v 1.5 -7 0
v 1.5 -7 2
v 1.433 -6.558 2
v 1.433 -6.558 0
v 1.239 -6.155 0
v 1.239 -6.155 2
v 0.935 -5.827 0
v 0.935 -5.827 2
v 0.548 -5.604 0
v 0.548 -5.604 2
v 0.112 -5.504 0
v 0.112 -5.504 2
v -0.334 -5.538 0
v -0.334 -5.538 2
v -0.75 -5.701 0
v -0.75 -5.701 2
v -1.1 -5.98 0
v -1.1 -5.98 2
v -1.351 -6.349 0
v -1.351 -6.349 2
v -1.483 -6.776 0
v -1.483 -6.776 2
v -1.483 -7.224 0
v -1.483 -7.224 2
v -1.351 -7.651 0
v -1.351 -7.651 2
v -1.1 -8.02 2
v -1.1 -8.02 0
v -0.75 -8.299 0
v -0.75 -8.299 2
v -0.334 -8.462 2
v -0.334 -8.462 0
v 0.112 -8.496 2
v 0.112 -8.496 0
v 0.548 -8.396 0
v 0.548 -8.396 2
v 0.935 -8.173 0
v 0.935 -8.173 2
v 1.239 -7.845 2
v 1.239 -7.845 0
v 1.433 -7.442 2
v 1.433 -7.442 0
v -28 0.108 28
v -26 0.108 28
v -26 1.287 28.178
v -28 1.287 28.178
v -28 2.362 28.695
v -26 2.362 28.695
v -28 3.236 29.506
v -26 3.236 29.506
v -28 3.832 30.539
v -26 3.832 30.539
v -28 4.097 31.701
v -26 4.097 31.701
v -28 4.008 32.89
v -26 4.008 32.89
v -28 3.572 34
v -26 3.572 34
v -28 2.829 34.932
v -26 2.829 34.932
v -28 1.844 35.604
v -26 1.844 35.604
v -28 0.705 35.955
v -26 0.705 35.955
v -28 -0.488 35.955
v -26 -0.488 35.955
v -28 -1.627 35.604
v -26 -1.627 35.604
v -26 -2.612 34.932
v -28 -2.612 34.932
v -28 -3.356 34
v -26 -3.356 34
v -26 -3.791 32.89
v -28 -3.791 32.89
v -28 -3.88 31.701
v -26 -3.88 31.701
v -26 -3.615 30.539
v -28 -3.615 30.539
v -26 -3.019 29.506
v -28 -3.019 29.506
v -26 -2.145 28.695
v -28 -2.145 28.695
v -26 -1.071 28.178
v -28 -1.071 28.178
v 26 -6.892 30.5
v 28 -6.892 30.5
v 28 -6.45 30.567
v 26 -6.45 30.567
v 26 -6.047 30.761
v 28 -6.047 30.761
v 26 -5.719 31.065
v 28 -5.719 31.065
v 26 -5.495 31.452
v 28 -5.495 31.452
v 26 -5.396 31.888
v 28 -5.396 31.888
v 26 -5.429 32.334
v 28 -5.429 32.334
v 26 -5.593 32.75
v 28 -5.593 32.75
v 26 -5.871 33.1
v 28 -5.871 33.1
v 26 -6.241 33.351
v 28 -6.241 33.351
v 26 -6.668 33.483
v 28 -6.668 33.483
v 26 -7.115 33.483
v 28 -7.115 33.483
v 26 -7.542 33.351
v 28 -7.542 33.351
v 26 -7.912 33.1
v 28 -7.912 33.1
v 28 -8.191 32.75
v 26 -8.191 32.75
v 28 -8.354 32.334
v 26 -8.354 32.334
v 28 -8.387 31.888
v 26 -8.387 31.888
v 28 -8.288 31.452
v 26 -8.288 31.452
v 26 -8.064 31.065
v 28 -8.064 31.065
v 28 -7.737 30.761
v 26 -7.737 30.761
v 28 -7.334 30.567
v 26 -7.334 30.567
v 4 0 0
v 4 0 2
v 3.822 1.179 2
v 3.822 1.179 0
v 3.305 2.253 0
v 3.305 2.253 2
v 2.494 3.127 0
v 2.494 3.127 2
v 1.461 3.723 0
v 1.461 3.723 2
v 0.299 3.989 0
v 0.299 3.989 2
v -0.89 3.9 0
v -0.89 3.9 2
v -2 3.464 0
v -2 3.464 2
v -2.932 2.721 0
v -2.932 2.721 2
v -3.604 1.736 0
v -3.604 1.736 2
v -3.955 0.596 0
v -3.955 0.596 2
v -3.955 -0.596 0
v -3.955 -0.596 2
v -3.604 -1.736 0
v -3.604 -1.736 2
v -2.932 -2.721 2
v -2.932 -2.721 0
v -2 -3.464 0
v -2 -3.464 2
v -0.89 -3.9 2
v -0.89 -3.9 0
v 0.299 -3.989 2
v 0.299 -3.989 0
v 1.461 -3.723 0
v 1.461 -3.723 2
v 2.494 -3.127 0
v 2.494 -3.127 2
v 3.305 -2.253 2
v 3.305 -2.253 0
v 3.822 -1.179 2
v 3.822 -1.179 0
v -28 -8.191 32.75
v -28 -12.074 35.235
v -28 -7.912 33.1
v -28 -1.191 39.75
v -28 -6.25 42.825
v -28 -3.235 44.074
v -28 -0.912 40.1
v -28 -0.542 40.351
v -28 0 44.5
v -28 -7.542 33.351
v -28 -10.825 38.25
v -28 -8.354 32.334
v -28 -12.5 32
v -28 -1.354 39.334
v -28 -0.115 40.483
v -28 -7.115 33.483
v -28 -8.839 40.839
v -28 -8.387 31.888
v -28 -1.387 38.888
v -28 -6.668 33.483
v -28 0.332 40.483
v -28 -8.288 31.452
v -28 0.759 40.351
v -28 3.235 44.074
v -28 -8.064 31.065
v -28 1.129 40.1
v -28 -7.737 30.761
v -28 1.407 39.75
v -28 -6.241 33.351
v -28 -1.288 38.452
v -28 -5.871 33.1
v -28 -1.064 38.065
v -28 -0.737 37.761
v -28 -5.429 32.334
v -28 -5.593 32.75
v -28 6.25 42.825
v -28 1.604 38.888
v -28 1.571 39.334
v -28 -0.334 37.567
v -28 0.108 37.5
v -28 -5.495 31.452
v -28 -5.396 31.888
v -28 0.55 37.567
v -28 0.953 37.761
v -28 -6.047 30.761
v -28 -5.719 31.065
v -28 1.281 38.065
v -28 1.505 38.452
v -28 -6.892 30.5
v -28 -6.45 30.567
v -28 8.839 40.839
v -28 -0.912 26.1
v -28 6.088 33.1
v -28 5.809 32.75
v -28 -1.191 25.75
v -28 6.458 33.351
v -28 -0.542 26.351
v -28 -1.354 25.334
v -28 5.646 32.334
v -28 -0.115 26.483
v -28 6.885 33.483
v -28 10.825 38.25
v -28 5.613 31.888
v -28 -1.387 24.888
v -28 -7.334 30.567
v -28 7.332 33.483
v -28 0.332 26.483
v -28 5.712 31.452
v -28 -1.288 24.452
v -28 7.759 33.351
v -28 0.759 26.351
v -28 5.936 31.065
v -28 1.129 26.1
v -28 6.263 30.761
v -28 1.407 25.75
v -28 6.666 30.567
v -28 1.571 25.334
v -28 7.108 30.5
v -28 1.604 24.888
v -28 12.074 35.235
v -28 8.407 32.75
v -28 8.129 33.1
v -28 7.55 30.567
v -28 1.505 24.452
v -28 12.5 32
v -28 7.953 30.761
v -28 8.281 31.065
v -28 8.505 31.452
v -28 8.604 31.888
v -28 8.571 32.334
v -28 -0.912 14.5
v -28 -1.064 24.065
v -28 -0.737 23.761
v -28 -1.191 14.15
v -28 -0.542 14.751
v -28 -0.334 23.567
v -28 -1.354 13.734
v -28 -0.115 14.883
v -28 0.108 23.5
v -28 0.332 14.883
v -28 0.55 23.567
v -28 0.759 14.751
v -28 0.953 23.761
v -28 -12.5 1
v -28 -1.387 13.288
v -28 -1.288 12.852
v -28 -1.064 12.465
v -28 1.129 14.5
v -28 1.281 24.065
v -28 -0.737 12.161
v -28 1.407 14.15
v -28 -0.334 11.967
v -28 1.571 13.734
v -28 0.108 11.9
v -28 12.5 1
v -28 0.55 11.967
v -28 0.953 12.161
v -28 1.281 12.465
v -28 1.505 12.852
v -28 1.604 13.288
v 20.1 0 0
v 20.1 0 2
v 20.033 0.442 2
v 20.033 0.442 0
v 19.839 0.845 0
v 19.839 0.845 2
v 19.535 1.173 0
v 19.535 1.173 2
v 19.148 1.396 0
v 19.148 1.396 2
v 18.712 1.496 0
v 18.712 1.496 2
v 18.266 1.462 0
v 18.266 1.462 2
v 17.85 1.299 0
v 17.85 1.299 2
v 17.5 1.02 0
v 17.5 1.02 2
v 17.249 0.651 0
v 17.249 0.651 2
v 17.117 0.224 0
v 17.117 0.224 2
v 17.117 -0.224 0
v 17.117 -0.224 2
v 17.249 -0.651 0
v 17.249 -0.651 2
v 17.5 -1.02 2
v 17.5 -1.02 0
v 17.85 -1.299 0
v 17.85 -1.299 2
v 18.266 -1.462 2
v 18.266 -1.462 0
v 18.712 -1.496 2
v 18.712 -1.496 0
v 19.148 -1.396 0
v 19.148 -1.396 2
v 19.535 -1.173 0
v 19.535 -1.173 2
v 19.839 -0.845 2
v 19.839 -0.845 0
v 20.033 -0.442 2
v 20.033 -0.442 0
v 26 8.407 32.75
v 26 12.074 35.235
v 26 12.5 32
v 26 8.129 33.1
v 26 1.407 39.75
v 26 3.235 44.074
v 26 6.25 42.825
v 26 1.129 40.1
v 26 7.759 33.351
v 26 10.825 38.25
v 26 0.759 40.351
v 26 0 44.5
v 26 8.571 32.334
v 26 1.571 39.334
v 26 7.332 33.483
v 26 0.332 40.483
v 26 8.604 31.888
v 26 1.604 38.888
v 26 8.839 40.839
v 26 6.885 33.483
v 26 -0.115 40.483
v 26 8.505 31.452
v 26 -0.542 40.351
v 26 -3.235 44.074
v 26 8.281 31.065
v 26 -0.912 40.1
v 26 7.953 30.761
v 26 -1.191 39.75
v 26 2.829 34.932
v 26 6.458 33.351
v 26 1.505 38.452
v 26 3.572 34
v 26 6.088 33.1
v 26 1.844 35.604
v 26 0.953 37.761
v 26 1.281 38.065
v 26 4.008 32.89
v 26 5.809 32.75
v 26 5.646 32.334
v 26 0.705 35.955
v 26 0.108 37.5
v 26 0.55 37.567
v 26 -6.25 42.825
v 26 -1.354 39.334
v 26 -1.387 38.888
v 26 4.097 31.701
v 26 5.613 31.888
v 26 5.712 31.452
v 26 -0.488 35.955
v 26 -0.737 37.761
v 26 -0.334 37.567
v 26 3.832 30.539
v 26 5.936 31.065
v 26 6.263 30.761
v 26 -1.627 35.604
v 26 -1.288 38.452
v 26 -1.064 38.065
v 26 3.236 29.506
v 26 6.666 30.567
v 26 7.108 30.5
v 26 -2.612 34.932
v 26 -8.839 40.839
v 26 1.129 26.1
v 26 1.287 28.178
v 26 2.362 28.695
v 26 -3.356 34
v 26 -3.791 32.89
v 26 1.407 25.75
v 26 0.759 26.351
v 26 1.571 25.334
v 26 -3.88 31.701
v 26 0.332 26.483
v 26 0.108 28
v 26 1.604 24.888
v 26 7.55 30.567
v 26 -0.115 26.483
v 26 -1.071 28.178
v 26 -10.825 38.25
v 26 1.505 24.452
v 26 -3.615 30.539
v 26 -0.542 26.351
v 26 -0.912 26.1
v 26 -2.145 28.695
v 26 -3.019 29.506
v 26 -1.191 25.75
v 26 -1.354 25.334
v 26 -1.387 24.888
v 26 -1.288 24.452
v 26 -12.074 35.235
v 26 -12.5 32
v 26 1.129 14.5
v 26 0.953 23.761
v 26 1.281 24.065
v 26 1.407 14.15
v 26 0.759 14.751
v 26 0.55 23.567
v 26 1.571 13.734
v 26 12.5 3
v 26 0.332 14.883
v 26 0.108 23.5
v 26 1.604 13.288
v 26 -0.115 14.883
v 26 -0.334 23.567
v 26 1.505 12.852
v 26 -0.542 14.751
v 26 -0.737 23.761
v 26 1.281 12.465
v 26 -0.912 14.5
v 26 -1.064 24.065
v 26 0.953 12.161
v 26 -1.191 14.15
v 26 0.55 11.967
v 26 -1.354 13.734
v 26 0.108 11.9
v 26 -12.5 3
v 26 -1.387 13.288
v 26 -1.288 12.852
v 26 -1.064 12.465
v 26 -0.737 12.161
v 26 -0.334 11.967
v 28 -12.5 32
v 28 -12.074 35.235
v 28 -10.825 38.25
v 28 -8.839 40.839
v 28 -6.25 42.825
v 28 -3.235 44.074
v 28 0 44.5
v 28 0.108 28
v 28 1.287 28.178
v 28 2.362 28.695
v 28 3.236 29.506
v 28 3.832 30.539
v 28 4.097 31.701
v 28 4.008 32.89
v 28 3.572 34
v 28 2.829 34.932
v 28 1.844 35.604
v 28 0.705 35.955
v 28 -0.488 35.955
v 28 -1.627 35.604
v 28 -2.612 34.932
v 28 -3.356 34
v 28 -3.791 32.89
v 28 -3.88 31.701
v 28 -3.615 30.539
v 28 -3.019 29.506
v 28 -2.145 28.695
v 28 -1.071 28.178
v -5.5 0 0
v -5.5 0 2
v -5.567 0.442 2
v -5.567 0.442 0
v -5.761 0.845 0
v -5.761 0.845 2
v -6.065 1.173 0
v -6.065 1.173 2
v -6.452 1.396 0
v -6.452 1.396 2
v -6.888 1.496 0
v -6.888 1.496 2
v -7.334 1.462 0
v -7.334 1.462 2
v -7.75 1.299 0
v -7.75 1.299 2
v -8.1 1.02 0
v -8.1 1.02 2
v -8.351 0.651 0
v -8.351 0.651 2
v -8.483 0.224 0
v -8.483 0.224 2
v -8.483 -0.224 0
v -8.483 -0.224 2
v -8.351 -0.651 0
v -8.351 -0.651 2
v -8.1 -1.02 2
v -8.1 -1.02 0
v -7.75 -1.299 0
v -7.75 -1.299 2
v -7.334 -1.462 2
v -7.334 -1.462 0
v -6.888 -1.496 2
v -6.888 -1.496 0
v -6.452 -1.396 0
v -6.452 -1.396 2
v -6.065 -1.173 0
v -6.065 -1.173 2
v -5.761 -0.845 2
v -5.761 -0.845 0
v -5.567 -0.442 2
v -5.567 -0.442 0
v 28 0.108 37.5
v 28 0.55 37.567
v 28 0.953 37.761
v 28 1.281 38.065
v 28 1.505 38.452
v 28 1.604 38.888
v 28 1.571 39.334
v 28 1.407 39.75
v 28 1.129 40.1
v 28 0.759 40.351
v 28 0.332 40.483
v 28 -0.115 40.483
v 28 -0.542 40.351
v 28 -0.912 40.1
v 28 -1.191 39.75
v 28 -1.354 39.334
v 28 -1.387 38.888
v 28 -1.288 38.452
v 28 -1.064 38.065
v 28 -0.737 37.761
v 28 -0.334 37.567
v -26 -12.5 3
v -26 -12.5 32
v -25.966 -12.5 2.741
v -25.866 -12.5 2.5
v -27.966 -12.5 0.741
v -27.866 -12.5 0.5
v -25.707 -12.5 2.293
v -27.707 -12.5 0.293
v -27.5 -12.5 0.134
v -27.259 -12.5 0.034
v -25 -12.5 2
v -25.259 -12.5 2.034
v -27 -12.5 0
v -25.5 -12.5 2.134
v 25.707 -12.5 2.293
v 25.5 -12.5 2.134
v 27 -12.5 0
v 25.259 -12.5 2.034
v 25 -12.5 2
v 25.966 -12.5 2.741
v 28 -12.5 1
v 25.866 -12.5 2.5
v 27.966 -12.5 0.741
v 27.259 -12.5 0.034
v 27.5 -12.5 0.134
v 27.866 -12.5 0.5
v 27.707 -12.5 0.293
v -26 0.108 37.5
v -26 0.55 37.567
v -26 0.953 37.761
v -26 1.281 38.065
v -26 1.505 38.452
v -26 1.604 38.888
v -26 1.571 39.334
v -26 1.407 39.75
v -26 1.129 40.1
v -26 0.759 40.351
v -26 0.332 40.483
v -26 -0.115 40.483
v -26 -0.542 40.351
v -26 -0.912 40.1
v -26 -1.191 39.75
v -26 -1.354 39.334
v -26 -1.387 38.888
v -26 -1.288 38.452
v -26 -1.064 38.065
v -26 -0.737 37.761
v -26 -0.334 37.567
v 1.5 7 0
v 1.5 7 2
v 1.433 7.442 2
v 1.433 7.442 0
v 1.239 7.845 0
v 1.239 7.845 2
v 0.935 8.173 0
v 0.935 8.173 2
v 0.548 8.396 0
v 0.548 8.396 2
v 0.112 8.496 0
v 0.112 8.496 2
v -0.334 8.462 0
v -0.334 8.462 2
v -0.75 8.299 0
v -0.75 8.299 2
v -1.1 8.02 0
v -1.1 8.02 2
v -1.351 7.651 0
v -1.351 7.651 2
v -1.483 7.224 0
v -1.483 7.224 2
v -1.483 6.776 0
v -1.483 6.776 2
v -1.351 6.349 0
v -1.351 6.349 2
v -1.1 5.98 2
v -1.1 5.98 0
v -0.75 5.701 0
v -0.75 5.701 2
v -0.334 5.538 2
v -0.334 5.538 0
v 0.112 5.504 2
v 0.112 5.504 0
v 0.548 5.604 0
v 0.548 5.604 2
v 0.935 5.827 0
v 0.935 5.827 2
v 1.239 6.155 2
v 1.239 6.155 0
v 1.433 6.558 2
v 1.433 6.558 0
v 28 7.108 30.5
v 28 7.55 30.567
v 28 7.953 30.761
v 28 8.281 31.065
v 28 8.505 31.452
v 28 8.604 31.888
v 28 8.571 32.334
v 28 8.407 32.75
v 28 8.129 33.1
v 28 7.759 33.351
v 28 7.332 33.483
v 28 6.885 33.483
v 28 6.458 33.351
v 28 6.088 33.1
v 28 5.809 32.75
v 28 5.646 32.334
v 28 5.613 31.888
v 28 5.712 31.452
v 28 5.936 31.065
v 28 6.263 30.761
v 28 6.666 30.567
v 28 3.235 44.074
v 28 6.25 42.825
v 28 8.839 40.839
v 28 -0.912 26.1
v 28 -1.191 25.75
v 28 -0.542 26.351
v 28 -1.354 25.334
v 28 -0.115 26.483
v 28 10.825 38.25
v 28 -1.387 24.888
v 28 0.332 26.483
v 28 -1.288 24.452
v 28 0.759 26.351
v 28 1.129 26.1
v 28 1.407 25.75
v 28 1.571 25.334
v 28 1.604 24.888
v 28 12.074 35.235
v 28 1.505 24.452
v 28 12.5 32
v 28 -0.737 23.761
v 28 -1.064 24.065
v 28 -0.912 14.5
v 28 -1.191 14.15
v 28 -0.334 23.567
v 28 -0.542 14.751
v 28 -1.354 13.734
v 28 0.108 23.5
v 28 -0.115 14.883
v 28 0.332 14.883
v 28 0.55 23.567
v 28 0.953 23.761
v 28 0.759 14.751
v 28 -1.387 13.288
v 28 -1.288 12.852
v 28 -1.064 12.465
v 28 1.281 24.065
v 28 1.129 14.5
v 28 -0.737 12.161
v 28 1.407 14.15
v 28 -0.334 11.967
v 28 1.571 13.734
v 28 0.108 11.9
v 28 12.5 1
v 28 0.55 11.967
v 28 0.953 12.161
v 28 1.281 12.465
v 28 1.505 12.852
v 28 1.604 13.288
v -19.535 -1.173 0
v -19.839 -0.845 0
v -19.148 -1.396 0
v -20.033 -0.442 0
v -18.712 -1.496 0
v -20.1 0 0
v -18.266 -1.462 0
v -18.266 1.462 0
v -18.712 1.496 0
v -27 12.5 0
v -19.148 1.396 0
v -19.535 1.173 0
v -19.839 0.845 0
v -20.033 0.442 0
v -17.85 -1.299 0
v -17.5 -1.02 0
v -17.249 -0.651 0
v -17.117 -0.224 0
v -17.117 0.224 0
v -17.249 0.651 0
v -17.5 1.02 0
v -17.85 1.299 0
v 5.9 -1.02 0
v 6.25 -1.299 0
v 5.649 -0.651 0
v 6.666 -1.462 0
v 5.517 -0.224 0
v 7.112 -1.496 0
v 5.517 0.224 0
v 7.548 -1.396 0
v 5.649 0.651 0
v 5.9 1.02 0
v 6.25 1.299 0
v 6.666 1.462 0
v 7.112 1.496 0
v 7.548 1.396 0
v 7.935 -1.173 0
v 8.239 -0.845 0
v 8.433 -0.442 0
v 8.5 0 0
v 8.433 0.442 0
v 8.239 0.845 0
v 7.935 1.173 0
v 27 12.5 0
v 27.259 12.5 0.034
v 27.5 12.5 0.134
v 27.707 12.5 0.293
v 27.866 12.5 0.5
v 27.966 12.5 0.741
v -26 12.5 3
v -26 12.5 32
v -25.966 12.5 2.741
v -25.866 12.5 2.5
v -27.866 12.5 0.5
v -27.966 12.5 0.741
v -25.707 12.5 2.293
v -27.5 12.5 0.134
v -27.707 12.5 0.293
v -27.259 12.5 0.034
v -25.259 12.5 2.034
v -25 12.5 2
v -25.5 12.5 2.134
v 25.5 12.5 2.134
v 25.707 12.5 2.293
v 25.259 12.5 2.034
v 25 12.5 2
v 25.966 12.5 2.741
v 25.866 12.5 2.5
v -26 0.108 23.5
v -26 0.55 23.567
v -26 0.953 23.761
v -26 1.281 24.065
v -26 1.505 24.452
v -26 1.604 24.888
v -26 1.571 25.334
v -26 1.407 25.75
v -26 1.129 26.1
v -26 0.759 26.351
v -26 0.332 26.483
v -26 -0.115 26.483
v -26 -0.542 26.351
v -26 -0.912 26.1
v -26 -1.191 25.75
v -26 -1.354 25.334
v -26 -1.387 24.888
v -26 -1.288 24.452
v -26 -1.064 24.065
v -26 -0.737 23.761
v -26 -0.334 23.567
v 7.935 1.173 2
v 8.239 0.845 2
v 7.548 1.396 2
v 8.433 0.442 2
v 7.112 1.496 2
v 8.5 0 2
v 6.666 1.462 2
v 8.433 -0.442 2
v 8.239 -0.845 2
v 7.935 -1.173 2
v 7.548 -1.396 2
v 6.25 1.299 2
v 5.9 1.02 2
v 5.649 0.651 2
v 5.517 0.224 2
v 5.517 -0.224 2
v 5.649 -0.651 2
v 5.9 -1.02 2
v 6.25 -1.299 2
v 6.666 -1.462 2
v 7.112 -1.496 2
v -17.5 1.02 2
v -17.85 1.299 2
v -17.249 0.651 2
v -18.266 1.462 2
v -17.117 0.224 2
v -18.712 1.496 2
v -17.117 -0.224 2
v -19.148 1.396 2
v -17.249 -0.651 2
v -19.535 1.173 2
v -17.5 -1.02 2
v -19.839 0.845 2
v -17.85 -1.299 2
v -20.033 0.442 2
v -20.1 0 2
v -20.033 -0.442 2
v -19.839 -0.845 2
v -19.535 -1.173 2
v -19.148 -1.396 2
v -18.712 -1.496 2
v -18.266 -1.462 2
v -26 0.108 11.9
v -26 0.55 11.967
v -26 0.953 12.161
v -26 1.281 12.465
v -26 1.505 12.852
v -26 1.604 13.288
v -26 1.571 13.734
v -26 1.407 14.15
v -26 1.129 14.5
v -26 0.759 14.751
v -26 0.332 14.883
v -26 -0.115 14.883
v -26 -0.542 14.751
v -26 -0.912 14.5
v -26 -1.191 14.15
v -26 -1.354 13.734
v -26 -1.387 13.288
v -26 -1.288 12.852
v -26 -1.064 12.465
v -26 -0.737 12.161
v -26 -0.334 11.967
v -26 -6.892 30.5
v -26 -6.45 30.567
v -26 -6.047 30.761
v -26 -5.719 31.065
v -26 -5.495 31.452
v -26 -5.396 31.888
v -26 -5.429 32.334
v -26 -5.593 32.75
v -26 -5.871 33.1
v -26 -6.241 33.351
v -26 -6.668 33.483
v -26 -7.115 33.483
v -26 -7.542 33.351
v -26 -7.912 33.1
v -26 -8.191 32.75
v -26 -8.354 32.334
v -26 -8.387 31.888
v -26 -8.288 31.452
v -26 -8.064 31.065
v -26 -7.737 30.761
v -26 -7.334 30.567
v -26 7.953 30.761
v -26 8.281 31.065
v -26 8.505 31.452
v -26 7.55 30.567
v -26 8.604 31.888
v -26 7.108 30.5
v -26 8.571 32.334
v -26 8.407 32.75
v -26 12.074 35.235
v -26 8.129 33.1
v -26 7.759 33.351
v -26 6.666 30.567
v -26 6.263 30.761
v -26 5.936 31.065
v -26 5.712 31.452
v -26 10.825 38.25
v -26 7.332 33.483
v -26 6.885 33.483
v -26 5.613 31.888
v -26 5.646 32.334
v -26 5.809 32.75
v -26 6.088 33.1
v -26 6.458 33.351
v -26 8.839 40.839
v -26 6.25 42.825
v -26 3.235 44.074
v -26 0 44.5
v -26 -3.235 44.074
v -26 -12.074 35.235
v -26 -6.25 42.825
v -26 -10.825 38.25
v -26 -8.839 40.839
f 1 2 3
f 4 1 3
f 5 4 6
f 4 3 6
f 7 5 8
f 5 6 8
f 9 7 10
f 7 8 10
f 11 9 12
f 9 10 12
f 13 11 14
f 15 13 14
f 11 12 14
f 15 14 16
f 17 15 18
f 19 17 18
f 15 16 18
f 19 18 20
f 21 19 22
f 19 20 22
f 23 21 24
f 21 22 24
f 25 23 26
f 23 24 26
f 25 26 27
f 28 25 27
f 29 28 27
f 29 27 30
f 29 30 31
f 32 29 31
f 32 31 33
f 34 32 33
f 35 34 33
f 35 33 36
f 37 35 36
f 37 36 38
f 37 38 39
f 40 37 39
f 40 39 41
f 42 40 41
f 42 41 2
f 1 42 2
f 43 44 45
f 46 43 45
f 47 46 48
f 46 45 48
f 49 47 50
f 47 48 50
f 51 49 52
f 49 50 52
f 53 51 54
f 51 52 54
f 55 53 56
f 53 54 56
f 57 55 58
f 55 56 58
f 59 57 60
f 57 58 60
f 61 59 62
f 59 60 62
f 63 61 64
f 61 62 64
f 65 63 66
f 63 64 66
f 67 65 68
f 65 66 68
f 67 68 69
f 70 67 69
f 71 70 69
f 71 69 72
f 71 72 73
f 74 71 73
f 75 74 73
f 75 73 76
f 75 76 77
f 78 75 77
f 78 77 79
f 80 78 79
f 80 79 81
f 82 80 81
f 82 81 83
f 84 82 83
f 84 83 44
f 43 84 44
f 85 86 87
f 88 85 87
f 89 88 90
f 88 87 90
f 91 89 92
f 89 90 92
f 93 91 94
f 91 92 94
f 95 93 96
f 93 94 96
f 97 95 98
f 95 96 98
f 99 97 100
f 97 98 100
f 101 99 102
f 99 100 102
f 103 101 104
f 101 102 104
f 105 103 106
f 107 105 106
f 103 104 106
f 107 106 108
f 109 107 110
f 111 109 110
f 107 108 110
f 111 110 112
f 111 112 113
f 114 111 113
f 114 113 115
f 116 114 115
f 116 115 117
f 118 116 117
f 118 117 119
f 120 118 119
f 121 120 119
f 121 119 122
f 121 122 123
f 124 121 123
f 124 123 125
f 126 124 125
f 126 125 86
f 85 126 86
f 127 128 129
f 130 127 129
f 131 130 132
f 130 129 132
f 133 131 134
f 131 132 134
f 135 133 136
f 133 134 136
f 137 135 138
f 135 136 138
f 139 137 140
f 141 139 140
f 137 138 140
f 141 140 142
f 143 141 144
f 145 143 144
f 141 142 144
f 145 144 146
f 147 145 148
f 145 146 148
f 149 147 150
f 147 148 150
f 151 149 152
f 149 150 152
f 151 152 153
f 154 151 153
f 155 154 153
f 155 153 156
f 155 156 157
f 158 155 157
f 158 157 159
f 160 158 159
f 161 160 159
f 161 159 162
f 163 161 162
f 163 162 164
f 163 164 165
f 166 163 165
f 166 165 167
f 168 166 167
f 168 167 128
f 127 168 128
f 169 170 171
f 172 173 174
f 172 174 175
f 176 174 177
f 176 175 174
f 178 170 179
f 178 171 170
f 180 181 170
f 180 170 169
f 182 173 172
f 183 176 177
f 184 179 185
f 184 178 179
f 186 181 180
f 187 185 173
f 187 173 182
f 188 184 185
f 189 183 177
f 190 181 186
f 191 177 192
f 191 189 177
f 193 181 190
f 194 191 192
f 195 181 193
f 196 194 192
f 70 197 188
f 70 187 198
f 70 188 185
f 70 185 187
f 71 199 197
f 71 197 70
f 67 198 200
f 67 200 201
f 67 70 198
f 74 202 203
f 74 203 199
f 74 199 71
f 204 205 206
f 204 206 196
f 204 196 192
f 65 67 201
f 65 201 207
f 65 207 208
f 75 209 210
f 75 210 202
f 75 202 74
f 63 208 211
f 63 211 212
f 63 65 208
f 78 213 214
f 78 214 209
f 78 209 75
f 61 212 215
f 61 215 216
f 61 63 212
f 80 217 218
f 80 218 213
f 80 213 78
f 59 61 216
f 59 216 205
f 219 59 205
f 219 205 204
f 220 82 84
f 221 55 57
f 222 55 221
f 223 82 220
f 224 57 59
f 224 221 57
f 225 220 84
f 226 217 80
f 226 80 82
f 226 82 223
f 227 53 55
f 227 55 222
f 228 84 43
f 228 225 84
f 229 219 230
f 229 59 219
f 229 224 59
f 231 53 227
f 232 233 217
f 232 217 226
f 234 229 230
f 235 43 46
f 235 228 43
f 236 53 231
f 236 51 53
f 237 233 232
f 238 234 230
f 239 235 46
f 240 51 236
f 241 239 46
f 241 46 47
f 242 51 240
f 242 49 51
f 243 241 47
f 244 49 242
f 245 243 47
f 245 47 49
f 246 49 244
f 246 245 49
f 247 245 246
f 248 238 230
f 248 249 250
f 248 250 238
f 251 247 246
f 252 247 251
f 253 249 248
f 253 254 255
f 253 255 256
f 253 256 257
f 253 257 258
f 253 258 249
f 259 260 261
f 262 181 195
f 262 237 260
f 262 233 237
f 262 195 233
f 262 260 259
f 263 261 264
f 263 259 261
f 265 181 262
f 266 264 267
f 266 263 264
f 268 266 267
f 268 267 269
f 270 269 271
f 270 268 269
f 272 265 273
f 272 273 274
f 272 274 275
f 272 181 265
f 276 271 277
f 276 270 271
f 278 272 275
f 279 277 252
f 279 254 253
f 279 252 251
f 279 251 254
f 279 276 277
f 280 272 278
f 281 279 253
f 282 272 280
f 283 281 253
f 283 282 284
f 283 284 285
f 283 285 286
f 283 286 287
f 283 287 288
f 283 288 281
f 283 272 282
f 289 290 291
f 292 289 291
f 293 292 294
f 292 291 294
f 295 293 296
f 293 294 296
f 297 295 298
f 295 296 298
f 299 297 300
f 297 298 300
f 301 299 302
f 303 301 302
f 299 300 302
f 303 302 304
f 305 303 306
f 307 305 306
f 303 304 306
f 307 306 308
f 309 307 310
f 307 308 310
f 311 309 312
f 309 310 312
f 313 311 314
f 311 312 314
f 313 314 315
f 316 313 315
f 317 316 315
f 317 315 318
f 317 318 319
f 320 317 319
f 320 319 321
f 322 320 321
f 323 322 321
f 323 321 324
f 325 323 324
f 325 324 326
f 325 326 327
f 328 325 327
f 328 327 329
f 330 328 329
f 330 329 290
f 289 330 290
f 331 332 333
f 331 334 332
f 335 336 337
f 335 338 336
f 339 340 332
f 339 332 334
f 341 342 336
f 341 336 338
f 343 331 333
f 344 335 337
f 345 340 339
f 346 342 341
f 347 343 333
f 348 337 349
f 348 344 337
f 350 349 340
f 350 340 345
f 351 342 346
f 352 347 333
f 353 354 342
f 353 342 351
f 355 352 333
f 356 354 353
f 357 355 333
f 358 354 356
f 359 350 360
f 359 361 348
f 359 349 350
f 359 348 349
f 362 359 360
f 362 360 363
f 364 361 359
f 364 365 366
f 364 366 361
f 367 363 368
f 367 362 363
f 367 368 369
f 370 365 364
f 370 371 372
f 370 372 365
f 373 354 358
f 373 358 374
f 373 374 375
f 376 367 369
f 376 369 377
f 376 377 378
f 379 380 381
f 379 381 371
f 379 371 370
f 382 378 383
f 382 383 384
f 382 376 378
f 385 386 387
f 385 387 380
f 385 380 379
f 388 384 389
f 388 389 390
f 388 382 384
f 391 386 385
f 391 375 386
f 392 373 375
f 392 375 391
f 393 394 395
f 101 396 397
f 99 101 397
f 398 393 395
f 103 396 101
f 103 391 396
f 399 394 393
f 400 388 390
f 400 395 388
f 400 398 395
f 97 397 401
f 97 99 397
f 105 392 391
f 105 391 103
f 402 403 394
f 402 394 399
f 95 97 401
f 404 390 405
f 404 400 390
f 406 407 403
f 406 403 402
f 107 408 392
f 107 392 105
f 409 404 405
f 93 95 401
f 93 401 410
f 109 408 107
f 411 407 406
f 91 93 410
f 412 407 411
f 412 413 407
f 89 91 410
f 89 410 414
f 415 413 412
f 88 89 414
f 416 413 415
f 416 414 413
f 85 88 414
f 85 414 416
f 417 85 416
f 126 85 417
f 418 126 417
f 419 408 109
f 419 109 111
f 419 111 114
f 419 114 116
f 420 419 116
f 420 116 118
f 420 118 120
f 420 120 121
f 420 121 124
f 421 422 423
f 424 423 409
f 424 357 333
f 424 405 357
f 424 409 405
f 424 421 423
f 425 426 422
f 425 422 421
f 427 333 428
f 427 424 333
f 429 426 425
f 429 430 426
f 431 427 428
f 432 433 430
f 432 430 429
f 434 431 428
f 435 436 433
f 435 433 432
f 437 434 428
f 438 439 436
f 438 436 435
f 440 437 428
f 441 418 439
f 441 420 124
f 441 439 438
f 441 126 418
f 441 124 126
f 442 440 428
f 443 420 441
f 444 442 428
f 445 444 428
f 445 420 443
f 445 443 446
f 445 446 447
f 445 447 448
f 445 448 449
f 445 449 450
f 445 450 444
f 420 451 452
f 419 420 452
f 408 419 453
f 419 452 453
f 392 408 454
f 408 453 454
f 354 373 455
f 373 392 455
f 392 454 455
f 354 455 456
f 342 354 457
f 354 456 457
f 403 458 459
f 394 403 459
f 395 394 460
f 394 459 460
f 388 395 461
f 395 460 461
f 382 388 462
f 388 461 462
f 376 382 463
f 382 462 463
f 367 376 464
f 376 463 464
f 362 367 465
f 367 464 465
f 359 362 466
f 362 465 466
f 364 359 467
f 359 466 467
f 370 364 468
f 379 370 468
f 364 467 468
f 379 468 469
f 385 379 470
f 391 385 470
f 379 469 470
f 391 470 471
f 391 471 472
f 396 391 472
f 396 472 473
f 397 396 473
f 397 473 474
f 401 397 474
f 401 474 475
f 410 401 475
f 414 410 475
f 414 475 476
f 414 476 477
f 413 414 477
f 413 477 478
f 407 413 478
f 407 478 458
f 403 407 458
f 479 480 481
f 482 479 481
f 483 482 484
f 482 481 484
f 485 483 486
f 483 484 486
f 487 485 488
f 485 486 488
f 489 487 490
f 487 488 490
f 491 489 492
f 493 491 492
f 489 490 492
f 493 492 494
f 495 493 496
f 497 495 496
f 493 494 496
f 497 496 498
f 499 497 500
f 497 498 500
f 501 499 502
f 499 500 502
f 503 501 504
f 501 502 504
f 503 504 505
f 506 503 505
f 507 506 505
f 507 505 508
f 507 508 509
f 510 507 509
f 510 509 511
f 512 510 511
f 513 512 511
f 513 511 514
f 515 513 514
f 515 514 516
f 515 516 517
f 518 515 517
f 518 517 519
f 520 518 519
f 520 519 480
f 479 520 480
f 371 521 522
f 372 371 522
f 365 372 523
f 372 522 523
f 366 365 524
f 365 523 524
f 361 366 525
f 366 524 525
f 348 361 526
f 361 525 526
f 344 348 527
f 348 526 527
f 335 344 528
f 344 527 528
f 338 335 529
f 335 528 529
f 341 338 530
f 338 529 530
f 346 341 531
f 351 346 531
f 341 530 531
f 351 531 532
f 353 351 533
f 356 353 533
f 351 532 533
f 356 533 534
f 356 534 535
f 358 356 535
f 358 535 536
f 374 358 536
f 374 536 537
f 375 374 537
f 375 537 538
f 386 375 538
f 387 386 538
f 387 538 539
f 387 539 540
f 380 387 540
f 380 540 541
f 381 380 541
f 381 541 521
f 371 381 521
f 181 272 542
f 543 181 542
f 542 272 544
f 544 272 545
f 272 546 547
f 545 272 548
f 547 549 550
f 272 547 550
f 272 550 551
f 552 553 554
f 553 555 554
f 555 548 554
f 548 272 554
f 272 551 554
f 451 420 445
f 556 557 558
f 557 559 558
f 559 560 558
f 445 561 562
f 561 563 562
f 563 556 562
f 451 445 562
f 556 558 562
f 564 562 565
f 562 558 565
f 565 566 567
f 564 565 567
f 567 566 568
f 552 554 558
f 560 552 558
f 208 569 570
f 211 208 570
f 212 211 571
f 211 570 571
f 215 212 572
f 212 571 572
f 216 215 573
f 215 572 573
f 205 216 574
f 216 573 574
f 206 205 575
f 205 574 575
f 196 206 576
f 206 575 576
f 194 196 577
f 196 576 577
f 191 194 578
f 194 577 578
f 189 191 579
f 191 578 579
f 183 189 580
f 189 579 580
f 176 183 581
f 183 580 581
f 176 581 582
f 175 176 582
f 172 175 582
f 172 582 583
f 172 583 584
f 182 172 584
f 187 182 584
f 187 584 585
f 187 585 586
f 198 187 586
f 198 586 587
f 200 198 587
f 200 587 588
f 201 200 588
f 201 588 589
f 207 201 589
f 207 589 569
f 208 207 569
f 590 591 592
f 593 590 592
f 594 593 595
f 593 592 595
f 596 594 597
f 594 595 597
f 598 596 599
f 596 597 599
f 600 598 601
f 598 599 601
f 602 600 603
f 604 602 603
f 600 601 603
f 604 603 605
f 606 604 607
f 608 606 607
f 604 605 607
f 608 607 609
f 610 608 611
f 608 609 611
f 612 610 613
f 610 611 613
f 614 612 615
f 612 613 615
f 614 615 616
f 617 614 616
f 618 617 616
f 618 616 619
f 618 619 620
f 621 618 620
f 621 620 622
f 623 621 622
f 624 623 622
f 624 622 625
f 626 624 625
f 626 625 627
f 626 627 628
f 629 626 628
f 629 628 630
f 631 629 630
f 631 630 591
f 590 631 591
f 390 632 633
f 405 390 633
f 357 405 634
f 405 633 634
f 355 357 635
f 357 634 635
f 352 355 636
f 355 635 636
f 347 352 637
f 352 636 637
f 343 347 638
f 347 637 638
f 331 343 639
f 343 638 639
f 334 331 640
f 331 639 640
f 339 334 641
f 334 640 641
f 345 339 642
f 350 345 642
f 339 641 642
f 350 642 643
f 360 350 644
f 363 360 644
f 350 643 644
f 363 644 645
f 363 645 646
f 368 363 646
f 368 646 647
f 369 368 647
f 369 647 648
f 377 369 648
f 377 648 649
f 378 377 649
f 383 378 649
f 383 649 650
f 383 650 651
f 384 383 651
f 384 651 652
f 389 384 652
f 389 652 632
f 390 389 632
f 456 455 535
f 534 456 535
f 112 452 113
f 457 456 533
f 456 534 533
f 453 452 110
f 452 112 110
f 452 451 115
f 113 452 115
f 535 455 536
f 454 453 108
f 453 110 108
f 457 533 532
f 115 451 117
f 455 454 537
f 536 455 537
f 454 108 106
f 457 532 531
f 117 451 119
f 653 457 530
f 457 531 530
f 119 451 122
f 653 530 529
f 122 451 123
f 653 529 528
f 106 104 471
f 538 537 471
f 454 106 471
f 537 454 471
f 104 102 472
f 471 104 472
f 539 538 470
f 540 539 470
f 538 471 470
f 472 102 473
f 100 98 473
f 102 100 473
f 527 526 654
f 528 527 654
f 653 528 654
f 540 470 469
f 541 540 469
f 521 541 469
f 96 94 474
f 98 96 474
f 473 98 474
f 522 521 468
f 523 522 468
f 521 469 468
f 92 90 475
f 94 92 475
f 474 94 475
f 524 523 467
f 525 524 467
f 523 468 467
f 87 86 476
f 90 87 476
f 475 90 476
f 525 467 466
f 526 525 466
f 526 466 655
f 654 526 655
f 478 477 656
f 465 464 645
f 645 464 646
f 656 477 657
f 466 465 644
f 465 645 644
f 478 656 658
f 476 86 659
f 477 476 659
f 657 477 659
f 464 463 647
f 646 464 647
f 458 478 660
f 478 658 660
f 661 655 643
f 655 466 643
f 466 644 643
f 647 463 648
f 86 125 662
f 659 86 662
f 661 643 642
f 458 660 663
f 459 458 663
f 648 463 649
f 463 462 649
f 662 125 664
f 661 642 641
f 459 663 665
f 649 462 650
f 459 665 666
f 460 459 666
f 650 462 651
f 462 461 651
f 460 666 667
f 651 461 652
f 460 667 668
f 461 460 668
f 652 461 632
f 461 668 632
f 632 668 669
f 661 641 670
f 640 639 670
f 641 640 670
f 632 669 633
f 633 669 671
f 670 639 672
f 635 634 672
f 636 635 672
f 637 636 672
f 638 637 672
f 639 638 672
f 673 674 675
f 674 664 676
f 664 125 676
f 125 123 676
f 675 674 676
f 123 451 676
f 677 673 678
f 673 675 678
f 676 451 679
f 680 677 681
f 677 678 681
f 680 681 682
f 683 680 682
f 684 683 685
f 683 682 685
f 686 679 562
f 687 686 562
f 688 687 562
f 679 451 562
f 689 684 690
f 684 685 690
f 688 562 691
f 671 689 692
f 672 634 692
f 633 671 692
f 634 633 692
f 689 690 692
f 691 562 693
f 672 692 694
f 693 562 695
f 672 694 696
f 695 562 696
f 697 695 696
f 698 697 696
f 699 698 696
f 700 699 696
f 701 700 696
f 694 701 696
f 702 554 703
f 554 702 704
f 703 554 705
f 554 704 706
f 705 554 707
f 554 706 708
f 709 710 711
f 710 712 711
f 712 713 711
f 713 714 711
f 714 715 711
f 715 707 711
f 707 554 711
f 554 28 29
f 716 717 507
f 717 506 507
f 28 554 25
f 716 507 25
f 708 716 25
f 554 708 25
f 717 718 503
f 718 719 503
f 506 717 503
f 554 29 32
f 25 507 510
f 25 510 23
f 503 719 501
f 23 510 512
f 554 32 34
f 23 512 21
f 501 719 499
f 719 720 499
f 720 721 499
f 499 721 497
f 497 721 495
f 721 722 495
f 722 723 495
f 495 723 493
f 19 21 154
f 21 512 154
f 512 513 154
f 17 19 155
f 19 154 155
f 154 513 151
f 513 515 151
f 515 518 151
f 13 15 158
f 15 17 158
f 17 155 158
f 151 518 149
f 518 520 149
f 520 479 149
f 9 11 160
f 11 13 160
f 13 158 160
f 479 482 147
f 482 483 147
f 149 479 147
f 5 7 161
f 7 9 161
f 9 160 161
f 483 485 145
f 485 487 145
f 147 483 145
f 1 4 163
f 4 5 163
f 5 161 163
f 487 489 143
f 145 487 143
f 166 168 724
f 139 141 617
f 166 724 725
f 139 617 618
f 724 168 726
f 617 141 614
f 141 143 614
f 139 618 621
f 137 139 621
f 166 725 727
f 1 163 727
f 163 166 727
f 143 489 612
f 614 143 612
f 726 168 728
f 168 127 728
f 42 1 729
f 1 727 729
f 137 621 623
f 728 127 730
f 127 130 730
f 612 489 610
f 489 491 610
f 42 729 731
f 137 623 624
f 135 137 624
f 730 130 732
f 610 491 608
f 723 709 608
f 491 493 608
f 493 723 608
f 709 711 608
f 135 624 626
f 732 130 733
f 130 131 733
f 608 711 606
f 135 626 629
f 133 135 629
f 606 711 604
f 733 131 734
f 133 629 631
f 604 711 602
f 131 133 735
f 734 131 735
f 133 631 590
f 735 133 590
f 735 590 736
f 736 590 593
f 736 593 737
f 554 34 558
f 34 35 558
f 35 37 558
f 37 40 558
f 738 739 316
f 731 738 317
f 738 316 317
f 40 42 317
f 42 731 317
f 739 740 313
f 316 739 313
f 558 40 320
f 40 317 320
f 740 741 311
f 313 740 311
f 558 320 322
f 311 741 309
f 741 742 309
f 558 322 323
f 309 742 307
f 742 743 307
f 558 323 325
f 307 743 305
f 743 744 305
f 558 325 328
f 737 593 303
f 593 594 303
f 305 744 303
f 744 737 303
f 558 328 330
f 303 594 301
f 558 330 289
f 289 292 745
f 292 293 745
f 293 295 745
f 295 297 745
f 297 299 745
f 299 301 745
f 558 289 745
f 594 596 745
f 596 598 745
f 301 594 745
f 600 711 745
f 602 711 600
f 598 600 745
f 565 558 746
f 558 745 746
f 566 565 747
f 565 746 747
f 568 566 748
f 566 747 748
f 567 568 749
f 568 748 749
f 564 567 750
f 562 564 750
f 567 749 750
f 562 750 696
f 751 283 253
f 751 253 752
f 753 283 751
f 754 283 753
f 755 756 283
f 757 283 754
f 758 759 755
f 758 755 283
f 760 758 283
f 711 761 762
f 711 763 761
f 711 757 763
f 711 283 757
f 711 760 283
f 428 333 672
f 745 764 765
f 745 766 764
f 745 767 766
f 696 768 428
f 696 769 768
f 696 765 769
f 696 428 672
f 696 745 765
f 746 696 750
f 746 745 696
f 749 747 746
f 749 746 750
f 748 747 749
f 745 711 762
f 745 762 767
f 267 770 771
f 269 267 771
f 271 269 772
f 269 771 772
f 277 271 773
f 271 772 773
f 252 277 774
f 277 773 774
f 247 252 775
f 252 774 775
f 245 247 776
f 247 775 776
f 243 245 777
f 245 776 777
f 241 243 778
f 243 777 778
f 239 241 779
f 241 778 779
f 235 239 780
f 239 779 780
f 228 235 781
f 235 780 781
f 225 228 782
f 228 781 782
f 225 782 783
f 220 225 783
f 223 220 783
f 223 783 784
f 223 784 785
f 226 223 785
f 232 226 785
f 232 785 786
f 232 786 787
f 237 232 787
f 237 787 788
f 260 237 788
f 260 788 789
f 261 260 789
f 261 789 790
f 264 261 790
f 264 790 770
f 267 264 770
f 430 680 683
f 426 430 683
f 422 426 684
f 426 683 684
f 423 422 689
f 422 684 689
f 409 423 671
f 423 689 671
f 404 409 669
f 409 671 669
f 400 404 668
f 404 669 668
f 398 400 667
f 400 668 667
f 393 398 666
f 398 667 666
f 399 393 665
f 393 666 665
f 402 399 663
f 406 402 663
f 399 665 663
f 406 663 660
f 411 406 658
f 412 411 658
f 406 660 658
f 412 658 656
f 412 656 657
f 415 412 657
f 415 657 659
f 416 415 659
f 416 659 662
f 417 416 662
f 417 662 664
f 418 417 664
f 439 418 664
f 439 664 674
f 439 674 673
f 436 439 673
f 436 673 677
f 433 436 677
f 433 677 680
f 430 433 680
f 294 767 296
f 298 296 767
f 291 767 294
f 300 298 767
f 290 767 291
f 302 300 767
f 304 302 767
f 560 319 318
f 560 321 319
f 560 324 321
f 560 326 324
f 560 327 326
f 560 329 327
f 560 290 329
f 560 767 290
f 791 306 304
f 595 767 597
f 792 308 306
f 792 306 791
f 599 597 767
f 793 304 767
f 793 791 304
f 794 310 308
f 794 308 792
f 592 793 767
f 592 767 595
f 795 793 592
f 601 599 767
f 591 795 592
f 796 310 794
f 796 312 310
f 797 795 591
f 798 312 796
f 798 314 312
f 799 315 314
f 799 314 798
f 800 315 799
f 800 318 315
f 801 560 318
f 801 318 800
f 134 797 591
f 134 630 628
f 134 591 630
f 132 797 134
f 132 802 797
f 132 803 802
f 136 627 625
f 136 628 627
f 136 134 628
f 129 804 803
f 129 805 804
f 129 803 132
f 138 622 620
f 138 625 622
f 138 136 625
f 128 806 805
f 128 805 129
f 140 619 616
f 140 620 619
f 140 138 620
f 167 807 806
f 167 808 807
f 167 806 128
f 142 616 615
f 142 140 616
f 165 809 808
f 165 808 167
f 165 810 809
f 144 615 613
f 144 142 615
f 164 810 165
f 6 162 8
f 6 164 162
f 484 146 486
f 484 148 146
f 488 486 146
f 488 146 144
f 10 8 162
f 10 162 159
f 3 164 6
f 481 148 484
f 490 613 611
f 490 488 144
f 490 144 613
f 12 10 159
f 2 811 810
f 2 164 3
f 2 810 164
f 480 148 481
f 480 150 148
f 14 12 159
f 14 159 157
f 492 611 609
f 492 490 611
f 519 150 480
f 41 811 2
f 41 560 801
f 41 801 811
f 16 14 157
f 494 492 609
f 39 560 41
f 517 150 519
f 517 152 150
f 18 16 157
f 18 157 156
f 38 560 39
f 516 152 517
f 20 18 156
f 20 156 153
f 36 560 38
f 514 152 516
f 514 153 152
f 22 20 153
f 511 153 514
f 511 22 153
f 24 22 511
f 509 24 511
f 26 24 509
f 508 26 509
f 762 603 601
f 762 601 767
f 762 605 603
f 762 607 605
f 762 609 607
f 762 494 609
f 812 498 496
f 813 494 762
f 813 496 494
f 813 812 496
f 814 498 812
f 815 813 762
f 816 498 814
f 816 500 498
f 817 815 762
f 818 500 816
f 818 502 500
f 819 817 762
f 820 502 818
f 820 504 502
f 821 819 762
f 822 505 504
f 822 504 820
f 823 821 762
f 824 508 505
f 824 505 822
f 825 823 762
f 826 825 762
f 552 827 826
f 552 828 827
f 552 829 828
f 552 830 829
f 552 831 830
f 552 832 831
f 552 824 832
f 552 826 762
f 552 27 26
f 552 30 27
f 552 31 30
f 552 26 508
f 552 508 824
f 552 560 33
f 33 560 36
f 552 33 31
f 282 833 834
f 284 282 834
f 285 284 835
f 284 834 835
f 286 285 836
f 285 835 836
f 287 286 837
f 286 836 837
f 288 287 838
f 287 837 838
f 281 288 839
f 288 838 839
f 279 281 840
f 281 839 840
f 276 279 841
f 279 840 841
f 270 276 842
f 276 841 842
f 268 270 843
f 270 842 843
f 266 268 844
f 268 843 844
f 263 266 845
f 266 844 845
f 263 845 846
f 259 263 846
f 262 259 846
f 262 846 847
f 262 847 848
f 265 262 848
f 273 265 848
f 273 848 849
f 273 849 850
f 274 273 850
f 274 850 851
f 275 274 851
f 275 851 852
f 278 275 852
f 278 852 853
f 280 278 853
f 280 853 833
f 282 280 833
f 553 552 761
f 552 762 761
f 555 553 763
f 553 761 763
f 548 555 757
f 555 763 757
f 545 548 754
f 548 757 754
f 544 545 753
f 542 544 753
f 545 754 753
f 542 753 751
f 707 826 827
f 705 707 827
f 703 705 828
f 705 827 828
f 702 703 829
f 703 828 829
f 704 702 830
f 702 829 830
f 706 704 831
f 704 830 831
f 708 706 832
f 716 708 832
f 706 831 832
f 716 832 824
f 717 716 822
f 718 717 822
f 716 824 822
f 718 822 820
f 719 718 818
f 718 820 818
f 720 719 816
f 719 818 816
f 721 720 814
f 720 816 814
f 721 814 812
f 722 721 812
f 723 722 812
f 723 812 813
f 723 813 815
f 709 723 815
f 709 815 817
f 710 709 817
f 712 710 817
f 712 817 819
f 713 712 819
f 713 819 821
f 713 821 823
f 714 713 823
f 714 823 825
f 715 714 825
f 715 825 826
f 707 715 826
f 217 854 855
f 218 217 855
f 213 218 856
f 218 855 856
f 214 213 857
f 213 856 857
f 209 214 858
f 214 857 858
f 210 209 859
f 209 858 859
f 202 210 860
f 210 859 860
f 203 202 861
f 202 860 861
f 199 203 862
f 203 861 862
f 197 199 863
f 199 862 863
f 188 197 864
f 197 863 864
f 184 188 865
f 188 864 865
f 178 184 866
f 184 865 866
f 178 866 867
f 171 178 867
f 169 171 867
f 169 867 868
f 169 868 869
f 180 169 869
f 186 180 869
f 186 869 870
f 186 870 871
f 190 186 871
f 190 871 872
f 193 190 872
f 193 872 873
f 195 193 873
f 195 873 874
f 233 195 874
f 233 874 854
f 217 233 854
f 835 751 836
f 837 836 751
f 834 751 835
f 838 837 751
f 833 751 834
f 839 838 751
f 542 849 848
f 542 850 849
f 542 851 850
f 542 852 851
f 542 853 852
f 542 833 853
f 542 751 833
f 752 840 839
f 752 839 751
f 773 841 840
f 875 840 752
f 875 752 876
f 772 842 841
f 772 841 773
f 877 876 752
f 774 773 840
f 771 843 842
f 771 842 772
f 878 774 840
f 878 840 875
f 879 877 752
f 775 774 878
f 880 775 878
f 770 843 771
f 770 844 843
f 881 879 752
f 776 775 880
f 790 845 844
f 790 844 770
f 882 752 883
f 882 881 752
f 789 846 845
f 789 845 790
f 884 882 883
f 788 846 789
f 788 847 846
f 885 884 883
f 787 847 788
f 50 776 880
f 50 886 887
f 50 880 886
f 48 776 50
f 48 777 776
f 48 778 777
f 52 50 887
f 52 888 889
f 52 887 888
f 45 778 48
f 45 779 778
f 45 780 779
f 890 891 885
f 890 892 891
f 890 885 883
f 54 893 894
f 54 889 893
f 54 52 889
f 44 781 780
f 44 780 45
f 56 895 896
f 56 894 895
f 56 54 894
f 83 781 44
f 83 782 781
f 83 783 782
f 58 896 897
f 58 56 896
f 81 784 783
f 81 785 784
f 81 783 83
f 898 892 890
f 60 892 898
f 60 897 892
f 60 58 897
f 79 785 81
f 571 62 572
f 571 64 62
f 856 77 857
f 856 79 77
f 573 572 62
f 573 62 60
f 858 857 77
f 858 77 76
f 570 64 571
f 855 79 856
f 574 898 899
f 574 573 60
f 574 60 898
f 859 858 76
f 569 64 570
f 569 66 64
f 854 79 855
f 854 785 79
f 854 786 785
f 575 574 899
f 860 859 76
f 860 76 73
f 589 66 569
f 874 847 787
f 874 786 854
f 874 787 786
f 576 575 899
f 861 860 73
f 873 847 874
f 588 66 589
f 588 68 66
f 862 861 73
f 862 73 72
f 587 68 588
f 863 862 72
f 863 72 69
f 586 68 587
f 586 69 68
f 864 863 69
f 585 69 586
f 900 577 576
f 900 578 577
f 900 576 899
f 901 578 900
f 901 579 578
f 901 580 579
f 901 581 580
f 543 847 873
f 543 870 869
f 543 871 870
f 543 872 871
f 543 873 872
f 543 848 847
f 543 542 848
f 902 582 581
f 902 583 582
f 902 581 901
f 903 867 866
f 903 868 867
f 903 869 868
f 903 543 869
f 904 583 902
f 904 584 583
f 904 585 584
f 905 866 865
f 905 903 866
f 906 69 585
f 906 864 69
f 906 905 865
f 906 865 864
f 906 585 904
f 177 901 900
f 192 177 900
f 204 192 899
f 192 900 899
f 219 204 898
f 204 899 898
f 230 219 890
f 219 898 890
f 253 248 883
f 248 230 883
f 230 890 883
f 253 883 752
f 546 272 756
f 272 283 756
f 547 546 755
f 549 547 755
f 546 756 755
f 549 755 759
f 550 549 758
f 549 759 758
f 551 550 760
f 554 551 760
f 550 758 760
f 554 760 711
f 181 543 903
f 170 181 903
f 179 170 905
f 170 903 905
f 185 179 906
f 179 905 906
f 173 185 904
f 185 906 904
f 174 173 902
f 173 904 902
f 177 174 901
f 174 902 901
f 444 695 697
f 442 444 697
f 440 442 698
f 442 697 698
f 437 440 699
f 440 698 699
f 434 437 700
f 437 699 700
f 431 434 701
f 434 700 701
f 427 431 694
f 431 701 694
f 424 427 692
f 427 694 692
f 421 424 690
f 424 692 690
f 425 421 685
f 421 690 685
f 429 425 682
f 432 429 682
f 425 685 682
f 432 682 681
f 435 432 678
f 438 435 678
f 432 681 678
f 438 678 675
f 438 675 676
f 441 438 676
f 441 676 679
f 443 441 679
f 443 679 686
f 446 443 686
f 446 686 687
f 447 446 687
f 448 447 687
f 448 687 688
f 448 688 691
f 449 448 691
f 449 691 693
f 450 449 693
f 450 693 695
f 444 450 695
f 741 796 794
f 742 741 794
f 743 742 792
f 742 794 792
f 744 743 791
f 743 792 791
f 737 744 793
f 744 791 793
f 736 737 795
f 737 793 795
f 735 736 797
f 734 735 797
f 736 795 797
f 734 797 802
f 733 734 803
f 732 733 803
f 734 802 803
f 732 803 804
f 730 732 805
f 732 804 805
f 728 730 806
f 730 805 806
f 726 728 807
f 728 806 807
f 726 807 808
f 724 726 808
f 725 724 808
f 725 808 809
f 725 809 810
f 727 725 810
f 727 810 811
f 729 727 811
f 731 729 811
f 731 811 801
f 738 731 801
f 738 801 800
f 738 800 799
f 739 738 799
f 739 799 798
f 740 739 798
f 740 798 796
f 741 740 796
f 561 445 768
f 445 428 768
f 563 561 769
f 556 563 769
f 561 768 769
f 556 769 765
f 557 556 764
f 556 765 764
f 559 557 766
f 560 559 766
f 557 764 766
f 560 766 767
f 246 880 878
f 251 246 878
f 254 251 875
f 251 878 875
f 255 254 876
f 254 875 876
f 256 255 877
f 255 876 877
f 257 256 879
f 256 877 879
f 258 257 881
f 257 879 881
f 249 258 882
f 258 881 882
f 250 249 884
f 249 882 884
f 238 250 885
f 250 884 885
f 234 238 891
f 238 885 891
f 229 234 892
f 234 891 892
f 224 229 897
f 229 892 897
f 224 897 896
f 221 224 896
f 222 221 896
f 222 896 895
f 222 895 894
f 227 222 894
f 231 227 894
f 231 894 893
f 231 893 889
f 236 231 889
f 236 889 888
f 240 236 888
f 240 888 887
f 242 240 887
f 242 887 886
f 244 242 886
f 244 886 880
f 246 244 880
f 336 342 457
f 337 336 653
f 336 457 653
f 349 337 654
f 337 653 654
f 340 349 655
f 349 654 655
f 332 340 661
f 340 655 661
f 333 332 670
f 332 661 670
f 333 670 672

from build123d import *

# Parameters (mm, degrees)
SKETCH_1_W          = 56
SKETCH_1_H          = 25
EXTRUDE_1_DEPTH     = 44.5
CUT_EXTRUDE_1_DEPTH = 59.21726548
CUT_EXTRUDE_2_DEPTH = 73.611982482
SKETCH_4_R          = 4
SKETCH_4_R_2        = 1.5
CUT_EXTRUDE_3_DEPTH = 53.407060593
SKETCH_5_R          = 4
SKETCH_5_R_2        = 1.5
CUT_EXTRUDE_4_DEPTH = 73.611982482
FILLET_1_R          = 1


with BuildPart() as part:
    # 草图1 → 凸台-拉伸1 (new body)
    with BuildSketch(Plane.XY):
        Rectangle(SKETCH_1_W, SKETCH_1_H)
    extrude(amount=EXTRUDE_1_DEPTH)

    # 草图2 → 切除-拉伸1 (cut, through all)
    with BuildSketch(Plane.XZ.offset(12.5)):
        Polygon((0, 44.5), (26, 44.5), (26, 2), (-26, 2), (-26, 44.5), align=None)
    extrude(amount=-CUT_EXTRUDE_1_DEPTH, mode=Mode.SUBTRACT)

    # 草图3 → 切除-拉伸2 (cut, through all)
    with BuildSketch(Plane(origin=(28, 0, 0), x_dir=(0, 0, -1), z_dir=(1, 0, 0))):
        with BuildLine():
            ThreePointArc((-44.5, 0), (-40.838834765, 8.838834765), (-32, 12.5))
            Line((-32, 12.5), (-44.5, 12.5))
            Line((-44.5, 12.5), (-44.5, 0))
        make_face()
        with BuildLine():
            ThreePointArc((-32, -12.5), (-40.838834765, -8.838834765), (-44.5, 0))
            Line((-44.5, 0), (-44.5, -12.5))
            Line((-44.5, -12.5), (-32, -12.5))
        make_face()
    extrude(amount=-CUT_EXTRUDE_2_DEPTH, mode=Mode.SUBTRACT)

    # 草图4 → 切除-拉伸3 (cut, through all)
    with BuildSketch(Plane.XY.offset(2)):
        Circle(SKETCH_4_R)
        with Locations((0, 7)):
            Circle(SKETCH_4_R_2)
        with Locations((0, -7)):
            Circle(SKETCH_4_R_2)
        with Locations((-7, 0)):
            Circle(SKETCH_4_R_2)
        with Locations((7, 0)):
            Circle(SKETCH_4_R_2)
        with Locations((18.6, 0)):
            Circle(SKETCH_4_R_2)
        with Locations(Location((-18.6, 0, 0), (0, 0, 180))):
            Circle(SKETCH_4_R_2)
    extrude(amount=-CUT_EXTRUDE_3_DEPTH, mode=Mode.SUBTRACT)

    # 草图5 → 切除-拉伸4 (cut, through all)
    with BuildSketch(Plane(origin=(28, 0, 0), x_dir=(0, 0, -1), z_dir=(1, 0, 0))):
        with Locations((-32, 0.108344676)):
            Circle(SKETCH_5_R)
        with Locations((-32, 7.108344676)):
            Circle(SKETCH_5_R_2)
        with Locations((-39, 0.108344676)):
            Circle(SKETCH_5_R_2)
        with Locations((-32, -6.891655324)):
            Circle(SKETCH_5_R_2)
        with Locations((-25, 0.108344676)):
            Circle(SKETCH_5_R_2)
        with Locations((-13.4, 0.108344676)):
            Circle(SKETCH_5_R_2)
    extrude(amount=-CUT_EXTRUDE_4_DEPTH, mode=Mode.SUBTRACT)

    # 圆角1
    fillet_1_edges = [part.edges().sort_by_distance(p)[0] for p in [
        (26, 0, 2),
        (-26, 0, 2),
        (-28, 0, 0),
        (28, 0, 0),
    ]]
    fillet(fillet_1_edges, radius=FILLET_1_R)


solid = part.part
